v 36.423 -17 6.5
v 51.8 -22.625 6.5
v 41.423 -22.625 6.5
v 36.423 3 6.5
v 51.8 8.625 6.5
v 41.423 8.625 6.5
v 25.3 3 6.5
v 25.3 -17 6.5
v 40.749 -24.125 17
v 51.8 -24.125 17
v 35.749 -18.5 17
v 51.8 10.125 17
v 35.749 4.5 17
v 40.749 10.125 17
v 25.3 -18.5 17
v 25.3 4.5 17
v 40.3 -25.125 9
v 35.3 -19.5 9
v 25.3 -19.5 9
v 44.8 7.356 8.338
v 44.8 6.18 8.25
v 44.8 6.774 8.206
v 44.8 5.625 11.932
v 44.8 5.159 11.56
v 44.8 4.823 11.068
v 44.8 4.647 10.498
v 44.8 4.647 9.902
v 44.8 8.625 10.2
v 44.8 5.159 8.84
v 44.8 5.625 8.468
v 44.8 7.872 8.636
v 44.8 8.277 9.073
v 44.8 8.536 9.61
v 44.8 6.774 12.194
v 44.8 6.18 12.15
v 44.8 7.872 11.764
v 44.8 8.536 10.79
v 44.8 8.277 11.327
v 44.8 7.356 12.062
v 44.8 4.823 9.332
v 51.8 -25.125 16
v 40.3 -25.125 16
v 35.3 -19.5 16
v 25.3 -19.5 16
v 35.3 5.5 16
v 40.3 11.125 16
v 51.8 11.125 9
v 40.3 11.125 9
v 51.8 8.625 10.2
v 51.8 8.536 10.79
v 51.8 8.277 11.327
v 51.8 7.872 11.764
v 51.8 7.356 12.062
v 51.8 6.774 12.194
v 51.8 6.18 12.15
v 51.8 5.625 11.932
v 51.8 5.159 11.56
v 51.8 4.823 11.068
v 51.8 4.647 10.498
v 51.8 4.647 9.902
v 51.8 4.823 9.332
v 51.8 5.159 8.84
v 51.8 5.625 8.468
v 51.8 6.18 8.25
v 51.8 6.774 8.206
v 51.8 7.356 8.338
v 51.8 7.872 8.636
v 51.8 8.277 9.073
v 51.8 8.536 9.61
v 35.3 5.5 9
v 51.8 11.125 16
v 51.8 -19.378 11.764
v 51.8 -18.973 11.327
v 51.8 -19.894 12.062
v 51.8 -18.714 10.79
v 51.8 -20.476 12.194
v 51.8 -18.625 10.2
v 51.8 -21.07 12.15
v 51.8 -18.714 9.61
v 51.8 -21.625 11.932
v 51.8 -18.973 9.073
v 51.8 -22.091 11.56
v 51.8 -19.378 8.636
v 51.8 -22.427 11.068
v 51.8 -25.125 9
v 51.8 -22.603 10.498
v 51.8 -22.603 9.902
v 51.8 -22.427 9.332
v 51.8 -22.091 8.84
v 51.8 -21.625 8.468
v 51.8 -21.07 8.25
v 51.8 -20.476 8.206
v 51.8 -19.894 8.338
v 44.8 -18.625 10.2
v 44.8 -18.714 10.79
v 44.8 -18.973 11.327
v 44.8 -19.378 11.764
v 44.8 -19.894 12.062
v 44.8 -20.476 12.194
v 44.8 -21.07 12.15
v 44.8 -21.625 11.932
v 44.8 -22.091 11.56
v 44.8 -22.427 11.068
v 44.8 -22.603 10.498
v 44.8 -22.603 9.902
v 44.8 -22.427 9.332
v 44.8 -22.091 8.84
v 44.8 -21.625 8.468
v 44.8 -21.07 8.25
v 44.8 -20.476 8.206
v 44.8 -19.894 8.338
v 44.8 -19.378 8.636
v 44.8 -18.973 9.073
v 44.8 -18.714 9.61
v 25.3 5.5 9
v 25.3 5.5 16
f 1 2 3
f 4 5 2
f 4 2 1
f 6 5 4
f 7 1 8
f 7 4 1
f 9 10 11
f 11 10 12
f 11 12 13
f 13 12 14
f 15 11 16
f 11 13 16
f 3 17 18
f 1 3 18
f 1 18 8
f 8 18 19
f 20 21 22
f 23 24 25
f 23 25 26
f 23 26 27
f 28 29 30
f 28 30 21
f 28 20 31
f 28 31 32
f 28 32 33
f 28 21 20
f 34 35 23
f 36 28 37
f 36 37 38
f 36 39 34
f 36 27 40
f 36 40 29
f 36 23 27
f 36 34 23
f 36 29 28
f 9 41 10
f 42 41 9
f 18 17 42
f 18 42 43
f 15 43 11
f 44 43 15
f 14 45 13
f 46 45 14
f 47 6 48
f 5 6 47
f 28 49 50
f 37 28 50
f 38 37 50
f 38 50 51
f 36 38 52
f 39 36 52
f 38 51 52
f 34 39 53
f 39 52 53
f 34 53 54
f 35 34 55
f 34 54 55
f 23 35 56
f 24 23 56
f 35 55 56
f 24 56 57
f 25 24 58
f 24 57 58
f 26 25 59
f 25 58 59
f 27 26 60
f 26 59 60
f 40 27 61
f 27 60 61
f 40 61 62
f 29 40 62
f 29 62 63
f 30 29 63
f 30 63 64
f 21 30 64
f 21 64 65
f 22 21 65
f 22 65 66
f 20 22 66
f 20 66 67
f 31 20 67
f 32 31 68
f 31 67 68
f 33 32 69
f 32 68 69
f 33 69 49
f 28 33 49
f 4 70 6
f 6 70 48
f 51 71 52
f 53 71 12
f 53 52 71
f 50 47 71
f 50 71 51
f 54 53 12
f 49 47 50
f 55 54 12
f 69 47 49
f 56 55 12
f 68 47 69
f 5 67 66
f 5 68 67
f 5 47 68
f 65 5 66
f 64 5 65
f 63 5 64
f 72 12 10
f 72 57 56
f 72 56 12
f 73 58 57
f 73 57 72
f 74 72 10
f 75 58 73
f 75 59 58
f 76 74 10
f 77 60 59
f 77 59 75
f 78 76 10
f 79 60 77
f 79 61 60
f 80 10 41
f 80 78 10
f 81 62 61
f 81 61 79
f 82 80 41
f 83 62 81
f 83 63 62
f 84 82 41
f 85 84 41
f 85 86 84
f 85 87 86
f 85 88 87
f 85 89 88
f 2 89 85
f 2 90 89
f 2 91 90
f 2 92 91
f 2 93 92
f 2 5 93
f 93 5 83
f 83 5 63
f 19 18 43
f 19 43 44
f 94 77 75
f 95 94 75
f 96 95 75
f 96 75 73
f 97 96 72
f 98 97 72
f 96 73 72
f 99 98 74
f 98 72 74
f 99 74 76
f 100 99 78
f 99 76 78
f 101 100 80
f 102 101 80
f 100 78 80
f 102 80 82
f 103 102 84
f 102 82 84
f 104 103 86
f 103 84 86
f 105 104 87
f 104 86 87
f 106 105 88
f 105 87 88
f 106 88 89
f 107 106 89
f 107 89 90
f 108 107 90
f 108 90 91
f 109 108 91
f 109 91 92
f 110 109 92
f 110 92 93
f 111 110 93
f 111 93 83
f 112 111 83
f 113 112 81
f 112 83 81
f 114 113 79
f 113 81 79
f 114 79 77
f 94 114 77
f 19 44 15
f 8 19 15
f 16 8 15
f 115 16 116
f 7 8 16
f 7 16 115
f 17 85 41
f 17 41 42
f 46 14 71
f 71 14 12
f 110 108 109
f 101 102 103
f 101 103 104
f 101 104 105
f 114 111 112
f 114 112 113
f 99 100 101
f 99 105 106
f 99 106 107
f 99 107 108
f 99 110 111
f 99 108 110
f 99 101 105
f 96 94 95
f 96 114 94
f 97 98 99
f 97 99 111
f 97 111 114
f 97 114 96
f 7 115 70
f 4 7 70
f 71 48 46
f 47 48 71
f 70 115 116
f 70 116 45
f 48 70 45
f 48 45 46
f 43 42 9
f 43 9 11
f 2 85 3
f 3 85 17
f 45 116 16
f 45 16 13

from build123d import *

# Parameters (mm, degrees)
PAD013_DEPTH    = 10.5
SKETCH042_R     = 2
POCKET028_DEPTH = 7
CHAMFER019_SIZE = 1
CHAMFER020_SIZE = 2.5


with BuildPart() as part:
    # Sketch041 → Pad013 (new body)
    with BuildSketch(Plane.XY):
        Polygon((26.5, 18.125), (26.5, -18.125), (15, -18.125), (10, -12.5), (0, -12.5), (0, 12.5), (10, 12.5), (15, 18.125), align=None)
    extrude(amount=PAD013_DEPTH)

    # Sketch042 (on Face3 of Pad013) → Pocket028 (cut)
    with BuildSketch(Plane.YZ.offset(26.5)):
        with Locations((-13.625, 3.7)):
            Circle(SKETCH042_R)
        with Locations((13.625, 3.7)):
            Circle(SKETCH042_R)
    extrude(amount=-POCKET028_DEPTH, mode=Mode.SUBTRACT)

    # Chamfer019
    chamfer019_edges = [part.edges().sort_by_distance(p)[0] for p in [
        (20.75, -18.125, 10.5),
        (12.5, -15.3125, 10.5),
        (5, -12.5, 10.5),
        (5, 12.5, 10.5),
        (12.5, 15.3125, 10.5),
        (20.75, 18.125, 10.5),
    ]]
    chamfer(chamfer019_edges, length=CHAMFER019_SIZE)

    # Chamfer020
    chamfer020_edges = [part.edges().sort_by_distance(p)[0] for p in [
        (5, -12.5, 0),
        (12.5, -15.3125, 0),
        (20.75, -18.125, 0),
        (5, 12.5, 0),
        (12.5, 15.3125, 0),
        (20.75, 18.125, 0),
    ]]
    chamfer(chamfer020_edges, length=CHAMFER020_SIZE)


with BuildPart() as part_1:
    # Body004007 placement: moved
    add(part.part.moved(Location((25.3, -7, 6.5))))


solid = part_1.part
